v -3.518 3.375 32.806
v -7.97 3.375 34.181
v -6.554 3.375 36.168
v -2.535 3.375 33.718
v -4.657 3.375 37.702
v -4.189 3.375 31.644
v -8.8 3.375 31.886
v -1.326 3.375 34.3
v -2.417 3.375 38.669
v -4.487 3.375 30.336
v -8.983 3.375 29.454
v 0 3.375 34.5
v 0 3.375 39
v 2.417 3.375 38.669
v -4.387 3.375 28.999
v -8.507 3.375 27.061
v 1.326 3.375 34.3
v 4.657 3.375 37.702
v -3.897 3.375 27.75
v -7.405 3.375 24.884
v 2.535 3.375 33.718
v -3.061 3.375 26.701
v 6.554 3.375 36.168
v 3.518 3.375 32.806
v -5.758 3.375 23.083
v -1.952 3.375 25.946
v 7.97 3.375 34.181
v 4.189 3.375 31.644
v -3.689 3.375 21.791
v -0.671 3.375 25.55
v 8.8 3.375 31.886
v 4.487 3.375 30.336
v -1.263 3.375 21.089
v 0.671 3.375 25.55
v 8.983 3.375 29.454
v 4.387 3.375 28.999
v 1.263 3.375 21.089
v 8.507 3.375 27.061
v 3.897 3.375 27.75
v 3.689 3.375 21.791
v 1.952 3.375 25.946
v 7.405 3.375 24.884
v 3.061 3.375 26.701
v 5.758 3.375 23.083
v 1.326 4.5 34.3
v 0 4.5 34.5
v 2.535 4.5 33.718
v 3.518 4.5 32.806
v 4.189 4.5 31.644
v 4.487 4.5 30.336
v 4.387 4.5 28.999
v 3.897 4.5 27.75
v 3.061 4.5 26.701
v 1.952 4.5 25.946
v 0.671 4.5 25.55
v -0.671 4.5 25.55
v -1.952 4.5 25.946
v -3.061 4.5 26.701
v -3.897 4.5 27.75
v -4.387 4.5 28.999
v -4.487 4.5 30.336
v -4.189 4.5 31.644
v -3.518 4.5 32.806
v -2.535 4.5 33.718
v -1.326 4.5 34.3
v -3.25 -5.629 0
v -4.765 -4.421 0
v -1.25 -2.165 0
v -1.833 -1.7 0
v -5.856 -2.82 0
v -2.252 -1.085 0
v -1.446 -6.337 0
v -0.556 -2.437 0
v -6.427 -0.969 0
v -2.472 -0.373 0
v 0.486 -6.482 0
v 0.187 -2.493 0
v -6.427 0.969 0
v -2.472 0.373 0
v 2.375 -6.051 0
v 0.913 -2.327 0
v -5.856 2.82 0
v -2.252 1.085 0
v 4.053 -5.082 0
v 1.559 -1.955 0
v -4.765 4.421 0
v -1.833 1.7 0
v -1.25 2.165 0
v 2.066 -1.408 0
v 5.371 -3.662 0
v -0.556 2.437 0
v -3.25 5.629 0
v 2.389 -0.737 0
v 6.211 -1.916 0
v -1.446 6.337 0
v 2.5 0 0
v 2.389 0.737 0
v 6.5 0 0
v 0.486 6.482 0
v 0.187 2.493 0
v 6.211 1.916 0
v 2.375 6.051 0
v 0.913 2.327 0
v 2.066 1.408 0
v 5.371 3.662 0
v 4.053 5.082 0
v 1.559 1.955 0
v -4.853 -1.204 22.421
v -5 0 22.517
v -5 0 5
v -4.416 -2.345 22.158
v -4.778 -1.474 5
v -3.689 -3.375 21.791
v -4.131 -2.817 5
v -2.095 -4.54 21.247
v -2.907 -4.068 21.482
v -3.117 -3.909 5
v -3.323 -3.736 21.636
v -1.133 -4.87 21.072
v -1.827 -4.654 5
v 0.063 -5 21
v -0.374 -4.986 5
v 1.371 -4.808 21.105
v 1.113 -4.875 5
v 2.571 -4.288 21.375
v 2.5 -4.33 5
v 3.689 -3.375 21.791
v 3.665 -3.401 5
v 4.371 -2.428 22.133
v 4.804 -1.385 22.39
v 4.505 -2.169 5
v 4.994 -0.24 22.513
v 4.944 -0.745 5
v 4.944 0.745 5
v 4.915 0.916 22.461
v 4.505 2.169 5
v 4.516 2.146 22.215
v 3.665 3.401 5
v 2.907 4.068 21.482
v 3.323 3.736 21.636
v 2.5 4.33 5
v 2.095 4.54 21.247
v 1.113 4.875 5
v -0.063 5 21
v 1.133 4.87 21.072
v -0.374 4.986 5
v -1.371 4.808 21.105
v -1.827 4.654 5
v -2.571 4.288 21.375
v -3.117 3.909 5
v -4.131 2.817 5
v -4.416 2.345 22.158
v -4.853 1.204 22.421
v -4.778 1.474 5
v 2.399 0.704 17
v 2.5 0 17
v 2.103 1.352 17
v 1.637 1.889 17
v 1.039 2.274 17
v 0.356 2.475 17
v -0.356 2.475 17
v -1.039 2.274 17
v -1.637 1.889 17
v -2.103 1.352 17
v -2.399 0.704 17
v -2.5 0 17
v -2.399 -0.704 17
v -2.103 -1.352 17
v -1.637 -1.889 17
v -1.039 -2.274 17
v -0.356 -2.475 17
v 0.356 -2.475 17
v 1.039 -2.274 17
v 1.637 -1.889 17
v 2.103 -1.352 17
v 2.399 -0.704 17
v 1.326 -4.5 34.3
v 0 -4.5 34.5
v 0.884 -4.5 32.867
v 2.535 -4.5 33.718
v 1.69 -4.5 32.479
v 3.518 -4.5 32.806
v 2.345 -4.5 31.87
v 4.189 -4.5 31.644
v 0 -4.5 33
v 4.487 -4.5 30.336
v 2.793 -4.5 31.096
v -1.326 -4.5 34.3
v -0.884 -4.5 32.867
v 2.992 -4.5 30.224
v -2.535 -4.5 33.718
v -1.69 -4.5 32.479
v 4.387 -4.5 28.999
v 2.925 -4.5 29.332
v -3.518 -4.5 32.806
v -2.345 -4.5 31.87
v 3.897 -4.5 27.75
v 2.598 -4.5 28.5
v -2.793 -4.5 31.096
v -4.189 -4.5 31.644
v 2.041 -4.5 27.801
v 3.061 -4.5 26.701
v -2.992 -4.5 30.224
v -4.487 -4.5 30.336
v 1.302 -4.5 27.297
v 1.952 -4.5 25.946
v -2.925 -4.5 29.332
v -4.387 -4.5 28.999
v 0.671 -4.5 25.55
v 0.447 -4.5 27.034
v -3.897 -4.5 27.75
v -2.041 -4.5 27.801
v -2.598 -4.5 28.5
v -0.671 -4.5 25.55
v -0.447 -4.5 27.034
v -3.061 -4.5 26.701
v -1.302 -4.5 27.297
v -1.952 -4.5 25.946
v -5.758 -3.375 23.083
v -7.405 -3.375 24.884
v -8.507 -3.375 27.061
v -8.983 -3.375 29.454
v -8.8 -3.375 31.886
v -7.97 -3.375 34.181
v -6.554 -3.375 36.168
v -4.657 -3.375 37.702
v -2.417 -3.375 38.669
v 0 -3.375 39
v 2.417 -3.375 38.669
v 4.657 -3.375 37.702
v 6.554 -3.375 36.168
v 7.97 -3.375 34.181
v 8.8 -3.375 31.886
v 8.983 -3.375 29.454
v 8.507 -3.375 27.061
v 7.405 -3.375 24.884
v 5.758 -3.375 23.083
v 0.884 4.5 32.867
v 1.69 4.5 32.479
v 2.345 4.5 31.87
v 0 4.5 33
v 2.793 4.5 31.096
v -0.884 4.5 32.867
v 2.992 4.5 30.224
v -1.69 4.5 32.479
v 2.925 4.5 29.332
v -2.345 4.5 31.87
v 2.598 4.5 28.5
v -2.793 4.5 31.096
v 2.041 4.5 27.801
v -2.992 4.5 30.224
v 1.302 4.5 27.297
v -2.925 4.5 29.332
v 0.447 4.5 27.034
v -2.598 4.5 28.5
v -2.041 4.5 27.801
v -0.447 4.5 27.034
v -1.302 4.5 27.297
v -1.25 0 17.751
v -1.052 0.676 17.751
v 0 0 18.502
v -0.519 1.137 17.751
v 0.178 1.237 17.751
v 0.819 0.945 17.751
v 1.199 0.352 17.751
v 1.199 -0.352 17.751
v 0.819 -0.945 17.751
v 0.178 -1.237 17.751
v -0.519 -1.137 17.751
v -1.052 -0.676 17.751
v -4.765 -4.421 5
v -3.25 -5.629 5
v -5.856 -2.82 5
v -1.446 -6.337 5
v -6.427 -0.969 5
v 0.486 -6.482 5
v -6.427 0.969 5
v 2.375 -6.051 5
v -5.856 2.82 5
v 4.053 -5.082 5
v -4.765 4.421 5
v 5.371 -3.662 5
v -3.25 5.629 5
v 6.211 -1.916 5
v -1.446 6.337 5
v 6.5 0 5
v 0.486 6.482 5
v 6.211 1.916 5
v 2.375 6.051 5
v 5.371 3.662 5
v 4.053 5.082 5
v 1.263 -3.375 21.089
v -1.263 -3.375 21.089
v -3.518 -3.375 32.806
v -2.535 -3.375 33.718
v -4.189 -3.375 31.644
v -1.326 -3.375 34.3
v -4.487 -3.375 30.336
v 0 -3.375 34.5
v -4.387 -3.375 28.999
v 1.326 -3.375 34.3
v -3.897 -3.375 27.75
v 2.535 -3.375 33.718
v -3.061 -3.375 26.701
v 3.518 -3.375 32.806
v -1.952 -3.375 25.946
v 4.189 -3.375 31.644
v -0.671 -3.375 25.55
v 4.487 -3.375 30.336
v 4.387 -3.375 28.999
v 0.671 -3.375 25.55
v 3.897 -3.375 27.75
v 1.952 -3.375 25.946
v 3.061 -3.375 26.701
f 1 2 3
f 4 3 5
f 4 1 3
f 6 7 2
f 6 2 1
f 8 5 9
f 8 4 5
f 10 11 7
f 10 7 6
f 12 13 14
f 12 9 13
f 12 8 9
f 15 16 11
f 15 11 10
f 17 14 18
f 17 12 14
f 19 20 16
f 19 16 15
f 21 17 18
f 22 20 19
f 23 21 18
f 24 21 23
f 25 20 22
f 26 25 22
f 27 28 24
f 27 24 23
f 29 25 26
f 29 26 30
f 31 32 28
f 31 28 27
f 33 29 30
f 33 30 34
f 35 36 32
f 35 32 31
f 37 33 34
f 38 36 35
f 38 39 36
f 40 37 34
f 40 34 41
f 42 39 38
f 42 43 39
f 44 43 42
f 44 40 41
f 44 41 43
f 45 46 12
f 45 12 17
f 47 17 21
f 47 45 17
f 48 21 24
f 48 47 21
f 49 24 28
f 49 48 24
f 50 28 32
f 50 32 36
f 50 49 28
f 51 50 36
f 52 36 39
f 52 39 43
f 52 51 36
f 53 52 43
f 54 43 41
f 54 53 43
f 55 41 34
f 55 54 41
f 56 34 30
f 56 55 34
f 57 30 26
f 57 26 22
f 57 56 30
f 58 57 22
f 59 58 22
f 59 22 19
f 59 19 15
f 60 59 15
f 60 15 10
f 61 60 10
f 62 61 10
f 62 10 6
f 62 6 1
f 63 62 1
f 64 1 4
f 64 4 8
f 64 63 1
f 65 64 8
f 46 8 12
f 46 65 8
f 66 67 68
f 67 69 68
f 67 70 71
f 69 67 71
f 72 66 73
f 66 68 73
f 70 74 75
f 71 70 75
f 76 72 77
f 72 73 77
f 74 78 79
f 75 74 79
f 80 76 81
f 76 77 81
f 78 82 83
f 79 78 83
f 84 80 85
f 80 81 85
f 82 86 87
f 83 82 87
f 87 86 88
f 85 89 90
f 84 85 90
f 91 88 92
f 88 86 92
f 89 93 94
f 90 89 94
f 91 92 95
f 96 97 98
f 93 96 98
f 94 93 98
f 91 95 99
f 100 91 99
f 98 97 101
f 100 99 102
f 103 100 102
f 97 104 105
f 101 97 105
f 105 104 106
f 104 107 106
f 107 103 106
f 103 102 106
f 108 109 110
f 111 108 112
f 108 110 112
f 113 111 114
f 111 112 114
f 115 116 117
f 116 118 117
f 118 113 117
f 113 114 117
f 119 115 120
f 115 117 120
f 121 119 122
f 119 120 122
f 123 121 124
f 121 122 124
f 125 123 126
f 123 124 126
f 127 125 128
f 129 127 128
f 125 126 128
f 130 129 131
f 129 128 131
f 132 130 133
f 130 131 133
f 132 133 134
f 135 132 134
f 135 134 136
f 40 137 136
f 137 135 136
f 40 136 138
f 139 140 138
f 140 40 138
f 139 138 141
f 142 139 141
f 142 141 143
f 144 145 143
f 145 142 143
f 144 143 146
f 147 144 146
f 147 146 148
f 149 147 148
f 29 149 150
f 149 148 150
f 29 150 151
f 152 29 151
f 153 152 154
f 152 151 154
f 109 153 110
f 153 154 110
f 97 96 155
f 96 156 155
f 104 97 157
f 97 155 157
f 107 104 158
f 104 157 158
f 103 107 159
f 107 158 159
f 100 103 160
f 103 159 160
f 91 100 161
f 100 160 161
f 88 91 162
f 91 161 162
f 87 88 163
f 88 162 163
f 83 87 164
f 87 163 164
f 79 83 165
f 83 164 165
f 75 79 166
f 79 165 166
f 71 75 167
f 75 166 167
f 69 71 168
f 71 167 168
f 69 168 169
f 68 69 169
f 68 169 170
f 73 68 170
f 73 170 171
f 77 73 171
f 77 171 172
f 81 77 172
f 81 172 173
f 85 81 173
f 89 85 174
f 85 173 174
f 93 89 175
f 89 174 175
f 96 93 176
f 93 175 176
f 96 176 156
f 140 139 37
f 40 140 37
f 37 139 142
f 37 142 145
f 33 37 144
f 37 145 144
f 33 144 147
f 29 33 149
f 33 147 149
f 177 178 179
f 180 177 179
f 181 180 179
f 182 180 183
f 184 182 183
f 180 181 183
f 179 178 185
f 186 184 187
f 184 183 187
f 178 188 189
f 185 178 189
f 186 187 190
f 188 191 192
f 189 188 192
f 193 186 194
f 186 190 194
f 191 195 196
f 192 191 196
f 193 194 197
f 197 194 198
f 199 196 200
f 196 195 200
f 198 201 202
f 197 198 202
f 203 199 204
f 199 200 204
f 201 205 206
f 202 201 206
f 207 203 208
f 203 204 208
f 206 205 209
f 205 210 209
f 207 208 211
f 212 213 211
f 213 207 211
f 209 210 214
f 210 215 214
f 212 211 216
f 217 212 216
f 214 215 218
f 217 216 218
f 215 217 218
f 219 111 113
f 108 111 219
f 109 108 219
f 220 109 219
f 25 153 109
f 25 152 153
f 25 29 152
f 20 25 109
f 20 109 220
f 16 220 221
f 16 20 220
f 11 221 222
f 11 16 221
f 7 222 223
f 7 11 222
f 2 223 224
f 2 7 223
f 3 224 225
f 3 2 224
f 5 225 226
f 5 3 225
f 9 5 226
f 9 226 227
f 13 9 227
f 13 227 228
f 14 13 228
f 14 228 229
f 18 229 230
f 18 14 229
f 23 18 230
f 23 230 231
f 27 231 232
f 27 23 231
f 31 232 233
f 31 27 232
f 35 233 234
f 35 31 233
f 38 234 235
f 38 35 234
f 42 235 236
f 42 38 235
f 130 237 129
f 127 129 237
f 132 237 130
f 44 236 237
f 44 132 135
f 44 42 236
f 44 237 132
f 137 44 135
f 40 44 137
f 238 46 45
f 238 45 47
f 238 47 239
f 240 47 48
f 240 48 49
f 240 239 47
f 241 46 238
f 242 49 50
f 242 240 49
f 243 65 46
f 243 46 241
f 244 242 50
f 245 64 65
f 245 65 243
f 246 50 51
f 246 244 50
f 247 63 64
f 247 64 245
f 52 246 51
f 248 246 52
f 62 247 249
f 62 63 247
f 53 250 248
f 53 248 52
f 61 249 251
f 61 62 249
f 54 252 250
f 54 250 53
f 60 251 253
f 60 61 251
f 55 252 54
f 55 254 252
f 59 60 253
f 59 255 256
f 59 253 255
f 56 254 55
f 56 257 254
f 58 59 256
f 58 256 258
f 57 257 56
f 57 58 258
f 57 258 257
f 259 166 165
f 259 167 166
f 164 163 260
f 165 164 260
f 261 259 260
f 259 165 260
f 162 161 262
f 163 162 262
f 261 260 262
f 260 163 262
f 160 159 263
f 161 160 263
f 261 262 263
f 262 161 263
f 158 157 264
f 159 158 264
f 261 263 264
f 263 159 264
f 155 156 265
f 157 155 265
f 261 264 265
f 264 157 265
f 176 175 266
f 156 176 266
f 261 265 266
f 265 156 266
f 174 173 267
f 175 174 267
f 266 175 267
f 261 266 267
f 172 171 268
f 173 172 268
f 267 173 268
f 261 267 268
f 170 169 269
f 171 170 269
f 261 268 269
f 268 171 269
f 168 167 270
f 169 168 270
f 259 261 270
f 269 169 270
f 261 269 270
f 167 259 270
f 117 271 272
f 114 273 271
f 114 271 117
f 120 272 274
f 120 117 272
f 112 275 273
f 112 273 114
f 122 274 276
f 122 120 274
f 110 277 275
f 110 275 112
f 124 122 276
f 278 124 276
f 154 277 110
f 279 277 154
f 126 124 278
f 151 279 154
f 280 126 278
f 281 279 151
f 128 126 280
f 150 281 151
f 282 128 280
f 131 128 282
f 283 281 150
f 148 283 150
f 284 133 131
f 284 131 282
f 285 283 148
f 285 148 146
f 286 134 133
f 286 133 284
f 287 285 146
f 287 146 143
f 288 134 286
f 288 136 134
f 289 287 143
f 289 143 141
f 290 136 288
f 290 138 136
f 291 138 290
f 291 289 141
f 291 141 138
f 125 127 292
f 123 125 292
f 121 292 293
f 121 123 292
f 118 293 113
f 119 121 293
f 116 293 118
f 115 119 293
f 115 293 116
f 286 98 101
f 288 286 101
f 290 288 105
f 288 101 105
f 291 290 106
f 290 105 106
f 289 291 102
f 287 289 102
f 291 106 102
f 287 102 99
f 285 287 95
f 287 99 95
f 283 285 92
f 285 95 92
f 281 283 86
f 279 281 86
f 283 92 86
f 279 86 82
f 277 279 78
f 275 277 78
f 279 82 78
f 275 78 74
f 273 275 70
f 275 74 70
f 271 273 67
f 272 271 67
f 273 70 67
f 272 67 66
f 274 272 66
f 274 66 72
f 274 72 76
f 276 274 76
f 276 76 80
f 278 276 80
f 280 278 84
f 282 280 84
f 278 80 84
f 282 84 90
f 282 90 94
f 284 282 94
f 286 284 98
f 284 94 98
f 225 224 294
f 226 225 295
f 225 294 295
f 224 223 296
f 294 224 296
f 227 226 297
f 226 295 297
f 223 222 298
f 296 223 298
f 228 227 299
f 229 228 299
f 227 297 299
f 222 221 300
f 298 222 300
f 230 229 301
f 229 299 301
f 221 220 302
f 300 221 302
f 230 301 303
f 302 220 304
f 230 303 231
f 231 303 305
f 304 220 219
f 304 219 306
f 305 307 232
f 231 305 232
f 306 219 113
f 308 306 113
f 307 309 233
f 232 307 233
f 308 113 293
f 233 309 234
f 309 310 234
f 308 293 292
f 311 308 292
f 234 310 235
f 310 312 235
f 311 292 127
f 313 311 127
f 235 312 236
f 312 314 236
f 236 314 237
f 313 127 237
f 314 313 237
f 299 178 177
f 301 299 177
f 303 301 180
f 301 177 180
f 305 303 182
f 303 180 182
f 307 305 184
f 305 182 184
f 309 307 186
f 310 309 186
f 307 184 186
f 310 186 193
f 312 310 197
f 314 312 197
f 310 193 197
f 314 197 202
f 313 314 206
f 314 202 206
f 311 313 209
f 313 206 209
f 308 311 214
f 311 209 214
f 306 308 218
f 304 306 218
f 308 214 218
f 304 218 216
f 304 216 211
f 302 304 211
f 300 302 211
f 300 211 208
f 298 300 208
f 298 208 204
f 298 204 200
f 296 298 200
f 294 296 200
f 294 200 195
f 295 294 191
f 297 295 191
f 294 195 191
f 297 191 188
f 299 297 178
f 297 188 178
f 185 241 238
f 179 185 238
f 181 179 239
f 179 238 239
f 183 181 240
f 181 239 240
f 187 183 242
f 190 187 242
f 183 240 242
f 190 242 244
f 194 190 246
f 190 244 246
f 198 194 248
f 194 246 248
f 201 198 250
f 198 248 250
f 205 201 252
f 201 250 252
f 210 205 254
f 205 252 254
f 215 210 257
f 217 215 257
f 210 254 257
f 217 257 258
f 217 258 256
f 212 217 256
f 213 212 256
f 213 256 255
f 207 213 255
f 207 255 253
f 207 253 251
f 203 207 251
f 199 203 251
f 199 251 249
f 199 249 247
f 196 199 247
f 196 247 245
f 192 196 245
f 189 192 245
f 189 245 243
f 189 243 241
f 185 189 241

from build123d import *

# Parameters (mm, degrees)
SKETCH_2_R             = 6.5
EXTRUDE_1_DEPTH        = 5
SKETCH_3_R             = 9
EXTRUDE_2_DEPTH        = 6.5
SKETCH_4_R             = 3
CUT_EXTRUDE_1_DEPTH    = 18
EXTRUDE_3_REACH        = 37.767
EXTRUDE_3_END_RADIUS   = 9
SKETCH_7_R             = 5
SKETCH_8_R             = 9
CUT_EXTRUDE_6_DEPTH    = 2
SKETCH_11_R            = 9
SKETCH_11_R_2          = 4.5
CUT_EXTRUDE_8_DEPTH    = 1.125
HOLE_WIZARD_M6_3_D     = 5
HOLE_WIZARD_M6_3_DEPTH = 17
HOLE_WIZARD_M6_3_TIP   = 1.502151548


with BuildPart() as part:
    # 草图2 → 凸台-拉伸1 (new body)
    with BuildSketch(Plane.XY):
        Circle(SKETCH_2_R)
    extrude(amount=EXTRUDE_1_DEPTH)



with BuildPart() as body_2:
    # 草图3 → 凸台-拉伸2 (new, symmetric)
    with BuildSketch(Plane(origin=(0, 0, 0), x_dir=(1, 0, 0), z_dir=(0, 1, 0))):
        with Locations(Location((0, -30, 0), (0, 0, 90))):
            Circle(SKETCH_3_R)
    extrude(amount=EXTRUDE_2_DEPTH, both=True)

    # 草图4 → 切除-拉伸1 (cut)
    with BuildSketch(Plane(origin=(0, 6.5, 0), x_dir=(1, 0, 0), z_dir=(0, 1, 0))):
        with Locations(Location((0, -30, 0), (0, 0, 270))):
            Circle(SKETCH_4_R)
    extrude(amount=-CUT_EXTRUDE_1_DEPTH, mode=Mode.SUBTRACT)


with BuildPart() as part_1:
    add(part.part)

    add(body_2.part)  # 凸台-拉伸3 merges body 2
    # 凸台-拉伸3: up to this cylinder (the profile starts outside it)
    extrude_3_end = Plane(origin=(0, 0, 30), z_dir=(0, -1, 0)) * Cylinder(EXTRUDE_3_END_RADIUS, 94.534, mode=Mode.PRIVATE)
    # 草图7 → 凸台-拉伸3 (add, up to the surface)
    with BuildSketch(Plane.XY.offset(5), mode=Mode.PRIVATE) as extrude_3_sk1:
        with Locations(Location((0, 0, 0), (0, 0, 180))):
            Circle(SKETCH_7_R)
    extrude_3_tool1 = extrude(extrude_3_sk1.sketch, amount=EXTRUDE_3_REACH, mode=Mode.PRIVATE) - extrude_3_end
    add(extrude_3_tool1.solids().sort_by_distance((0, 0, 5))[0])

    # 草图8 → 切除-拉伸6 (cut)
    with BuildSketch(Plane(origin=(0, 6.5, 0), x_dir=(1, 0, 0), z_dir=(0, 1, 0))):
        with Locations(Location((0, -30, 0), (0, 0, 75.985881611))):
            Circle(SKETCH_8_R)
    cut_extrude_6 = extrude(amount=-CUT_EXTRUDE_6_DEPTH, mode=Mode.SUBTRACT)

    # 镜向2: 切除-拉伸6 across plane
    add(cut_extrude_6.mirror(Plane.ZX), mode=Mode.SUBTRACT)

    # 草图11 → 切除-拉伸8 (cut)
    with BuildSketch(Plane(origin=(0, 4.5, 0), x_dir=(1, 0, 0), z_dir=(0, 1, 0))):
        with Locations((0, -30)):
            Circle(SKETCH_11_R)
        with Locations(Location((0, -30, 0), (0, 0, 270))):
            Circle(SKETCH_11_R_2, mode=Mode.SUBTRACT)
    cut_extrude_8 = extrude(amount=-CUT_EXTRUDE_8_DEPTH, mode=Mode.SUBTRACT)

    # 镜向3: 切除-拉伸8 across plane
    add(cut_extrude_8.mirror(Plane.ZX), mode=Mode.SUBTRACT)

    # M6 螺纹孔3
    with Locations(Plane(origin=(0, 0, 0), x_dir=(-1, 0, 0), z_dir=(0, 0, -1))):
        with Locations((0, 0)):
            Hole(HOLE_WIZARD_M6_3_D / 2, depth=HOLE_WIZARD_M6_3_DEPTH)
            with Locations((0, 0, -(HOLE_WIZARD_M6_3_DEPTH + HOLE_WIZARD_M6_3_TIP / 2))):  # 118° drill point
                Cone(0, HOLE_WIZARD_M6_3_D / 2, HOLE_WIZARD_M6_3_TIP, mode=Mode.SUBTRACT)


solid = part_1.part
